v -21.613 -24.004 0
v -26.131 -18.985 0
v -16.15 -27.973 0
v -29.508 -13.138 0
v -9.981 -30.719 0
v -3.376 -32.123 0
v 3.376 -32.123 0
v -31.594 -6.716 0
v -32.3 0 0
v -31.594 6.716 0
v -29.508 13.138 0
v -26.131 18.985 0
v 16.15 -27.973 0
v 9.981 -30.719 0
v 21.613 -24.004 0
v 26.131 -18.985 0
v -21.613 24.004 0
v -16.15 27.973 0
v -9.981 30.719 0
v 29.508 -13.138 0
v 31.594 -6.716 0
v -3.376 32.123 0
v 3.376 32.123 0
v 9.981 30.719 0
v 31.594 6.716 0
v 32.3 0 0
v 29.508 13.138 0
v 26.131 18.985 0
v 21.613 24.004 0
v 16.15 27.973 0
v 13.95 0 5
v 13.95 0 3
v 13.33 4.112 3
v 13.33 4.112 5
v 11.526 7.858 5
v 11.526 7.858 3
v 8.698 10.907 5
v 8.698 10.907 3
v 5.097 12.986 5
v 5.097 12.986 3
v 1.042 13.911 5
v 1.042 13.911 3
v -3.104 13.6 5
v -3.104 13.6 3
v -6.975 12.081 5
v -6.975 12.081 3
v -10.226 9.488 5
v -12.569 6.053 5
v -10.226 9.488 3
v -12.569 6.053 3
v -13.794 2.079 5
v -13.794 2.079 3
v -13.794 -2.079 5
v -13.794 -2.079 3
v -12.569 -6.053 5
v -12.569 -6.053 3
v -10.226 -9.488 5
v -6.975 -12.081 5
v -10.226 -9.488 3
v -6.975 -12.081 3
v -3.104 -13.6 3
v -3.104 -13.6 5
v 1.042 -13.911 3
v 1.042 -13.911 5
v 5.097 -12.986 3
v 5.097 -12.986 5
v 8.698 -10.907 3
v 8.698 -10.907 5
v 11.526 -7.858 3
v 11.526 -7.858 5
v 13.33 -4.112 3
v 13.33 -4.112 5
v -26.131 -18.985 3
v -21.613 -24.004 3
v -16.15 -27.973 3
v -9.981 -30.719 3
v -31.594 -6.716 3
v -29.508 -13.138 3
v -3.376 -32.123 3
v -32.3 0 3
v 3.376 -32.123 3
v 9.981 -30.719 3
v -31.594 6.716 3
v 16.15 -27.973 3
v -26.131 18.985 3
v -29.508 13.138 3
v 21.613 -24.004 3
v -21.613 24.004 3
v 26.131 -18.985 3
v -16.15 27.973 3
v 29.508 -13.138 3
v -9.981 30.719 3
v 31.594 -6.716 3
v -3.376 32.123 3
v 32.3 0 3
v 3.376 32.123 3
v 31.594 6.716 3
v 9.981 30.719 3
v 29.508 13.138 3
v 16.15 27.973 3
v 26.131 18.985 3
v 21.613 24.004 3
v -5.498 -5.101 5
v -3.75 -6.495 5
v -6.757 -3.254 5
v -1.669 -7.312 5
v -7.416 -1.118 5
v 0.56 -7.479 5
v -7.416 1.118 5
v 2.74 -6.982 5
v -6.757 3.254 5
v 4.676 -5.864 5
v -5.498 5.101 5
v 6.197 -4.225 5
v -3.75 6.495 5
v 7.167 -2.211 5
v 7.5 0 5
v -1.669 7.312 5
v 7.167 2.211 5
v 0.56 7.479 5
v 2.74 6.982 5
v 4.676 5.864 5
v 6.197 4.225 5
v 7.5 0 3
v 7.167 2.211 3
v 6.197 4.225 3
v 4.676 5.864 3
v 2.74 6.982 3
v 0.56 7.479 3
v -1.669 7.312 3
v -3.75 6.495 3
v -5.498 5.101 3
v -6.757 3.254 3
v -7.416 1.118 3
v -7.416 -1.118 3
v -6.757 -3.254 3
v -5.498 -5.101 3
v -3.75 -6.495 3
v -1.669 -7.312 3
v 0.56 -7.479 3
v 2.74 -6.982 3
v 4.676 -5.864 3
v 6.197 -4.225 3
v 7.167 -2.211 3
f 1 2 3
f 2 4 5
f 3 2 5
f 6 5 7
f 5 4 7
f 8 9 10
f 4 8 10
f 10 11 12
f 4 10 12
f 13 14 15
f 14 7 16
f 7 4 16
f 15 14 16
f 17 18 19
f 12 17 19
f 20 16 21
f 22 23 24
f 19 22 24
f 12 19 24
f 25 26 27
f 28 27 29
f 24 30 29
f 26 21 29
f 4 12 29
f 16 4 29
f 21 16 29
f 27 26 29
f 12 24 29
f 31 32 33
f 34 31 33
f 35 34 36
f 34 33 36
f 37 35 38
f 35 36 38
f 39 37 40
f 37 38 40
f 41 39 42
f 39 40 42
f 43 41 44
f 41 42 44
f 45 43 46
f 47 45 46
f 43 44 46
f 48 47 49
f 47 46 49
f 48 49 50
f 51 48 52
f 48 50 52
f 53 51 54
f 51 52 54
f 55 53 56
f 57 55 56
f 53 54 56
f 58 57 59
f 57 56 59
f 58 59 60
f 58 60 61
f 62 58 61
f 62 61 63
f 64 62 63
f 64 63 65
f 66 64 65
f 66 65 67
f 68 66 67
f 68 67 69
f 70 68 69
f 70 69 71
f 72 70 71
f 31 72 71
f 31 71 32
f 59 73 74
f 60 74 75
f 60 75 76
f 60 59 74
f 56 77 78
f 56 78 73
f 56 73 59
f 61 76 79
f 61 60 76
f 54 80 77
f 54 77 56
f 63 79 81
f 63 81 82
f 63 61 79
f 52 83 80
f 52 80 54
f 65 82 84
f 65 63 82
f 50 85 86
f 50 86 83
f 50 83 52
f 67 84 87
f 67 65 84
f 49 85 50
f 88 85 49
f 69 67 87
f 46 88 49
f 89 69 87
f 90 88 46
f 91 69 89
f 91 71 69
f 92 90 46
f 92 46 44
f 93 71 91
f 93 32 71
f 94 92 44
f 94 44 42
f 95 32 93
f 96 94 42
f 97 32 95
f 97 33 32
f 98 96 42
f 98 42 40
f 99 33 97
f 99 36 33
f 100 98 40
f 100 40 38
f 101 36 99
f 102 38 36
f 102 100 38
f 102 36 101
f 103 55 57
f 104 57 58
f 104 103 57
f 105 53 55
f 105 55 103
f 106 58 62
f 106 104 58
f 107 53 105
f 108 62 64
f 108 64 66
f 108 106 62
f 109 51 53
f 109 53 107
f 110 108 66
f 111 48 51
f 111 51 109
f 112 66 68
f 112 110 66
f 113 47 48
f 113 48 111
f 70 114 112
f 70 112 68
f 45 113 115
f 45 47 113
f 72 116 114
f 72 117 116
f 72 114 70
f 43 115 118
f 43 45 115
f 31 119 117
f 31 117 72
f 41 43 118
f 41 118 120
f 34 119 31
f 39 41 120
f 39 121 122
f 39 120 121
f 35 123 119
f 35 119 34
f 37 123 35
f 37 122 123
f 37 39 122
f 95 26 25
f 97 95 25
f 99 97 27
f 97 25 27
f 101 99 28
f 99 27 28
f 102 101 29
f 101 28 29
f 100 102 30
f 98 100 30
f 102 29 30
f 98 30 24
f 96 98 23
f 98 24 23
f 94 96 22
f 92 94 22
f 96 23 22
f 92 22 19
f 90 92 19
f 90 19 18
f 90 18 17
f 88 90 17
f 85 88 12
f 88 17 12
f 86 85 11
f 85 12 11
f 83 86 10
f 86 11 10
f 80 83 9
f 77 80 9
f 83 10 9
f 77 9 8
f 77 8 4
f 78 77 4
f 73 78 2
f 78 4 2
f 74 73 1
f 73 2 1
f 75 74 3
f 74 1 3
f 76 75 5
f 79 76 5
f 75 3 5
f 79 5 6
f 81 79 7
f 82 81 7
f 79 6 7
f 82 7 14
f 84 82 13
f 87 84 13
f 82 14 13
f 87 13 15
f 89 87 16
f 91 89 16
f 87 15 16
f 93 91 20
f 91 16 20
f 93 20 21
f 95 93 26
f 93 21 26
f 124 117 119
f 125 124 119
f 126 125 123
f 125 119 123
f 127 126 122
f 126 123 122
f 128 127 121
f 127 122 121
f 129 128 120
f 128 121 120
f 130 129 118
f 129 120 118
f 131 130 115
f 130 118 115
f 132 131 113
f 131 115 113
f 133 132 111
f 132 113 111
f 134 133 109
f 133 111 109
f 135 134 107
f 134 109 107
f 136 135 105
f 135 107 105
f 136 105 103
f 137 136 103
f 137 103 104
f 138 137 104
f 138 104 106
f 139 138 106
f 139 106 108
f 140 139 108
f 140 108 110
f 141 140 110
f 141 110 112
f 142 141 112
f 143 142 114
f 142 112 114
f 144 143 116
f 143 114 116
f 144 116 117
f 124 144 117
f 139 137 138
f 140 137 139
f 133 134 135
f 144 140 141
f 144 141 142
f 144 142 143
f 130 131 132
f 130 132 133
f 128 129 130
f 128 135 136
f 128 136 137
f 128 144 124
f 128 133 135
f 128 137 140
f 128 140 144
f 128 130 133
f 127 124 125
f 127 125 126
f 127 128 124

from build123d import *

# Parameters (mm, degrees)
F0_R     = 32.3
F1_DEPTH = 3
F2_R     = 13.95
F3_DEPTH = 5
F4_R     = 7.5
F5_DEPTH = 2


with BuildPart() as f1:
    # F0 (on Top) → F1 (new body)
    with BuildSketch(Plane.XY):
        Circle(F0_R)
    extrude(amount=F1_DEPTH)

    # F2 (on Top) → F3 (join)
    with BuildSketch(Plane.XY):
        Circle(F2_R)
    extrude(amount=F3_DEPTH)

    # F4 (on face) → F5 (cut)
    with BuildSketch(Plane.XY.offset(5)):
        Circle(F4_R)
    extrude(amount=-F5_DEPTH, mode=Mode.SUBTRACT)


solid = f1.part
